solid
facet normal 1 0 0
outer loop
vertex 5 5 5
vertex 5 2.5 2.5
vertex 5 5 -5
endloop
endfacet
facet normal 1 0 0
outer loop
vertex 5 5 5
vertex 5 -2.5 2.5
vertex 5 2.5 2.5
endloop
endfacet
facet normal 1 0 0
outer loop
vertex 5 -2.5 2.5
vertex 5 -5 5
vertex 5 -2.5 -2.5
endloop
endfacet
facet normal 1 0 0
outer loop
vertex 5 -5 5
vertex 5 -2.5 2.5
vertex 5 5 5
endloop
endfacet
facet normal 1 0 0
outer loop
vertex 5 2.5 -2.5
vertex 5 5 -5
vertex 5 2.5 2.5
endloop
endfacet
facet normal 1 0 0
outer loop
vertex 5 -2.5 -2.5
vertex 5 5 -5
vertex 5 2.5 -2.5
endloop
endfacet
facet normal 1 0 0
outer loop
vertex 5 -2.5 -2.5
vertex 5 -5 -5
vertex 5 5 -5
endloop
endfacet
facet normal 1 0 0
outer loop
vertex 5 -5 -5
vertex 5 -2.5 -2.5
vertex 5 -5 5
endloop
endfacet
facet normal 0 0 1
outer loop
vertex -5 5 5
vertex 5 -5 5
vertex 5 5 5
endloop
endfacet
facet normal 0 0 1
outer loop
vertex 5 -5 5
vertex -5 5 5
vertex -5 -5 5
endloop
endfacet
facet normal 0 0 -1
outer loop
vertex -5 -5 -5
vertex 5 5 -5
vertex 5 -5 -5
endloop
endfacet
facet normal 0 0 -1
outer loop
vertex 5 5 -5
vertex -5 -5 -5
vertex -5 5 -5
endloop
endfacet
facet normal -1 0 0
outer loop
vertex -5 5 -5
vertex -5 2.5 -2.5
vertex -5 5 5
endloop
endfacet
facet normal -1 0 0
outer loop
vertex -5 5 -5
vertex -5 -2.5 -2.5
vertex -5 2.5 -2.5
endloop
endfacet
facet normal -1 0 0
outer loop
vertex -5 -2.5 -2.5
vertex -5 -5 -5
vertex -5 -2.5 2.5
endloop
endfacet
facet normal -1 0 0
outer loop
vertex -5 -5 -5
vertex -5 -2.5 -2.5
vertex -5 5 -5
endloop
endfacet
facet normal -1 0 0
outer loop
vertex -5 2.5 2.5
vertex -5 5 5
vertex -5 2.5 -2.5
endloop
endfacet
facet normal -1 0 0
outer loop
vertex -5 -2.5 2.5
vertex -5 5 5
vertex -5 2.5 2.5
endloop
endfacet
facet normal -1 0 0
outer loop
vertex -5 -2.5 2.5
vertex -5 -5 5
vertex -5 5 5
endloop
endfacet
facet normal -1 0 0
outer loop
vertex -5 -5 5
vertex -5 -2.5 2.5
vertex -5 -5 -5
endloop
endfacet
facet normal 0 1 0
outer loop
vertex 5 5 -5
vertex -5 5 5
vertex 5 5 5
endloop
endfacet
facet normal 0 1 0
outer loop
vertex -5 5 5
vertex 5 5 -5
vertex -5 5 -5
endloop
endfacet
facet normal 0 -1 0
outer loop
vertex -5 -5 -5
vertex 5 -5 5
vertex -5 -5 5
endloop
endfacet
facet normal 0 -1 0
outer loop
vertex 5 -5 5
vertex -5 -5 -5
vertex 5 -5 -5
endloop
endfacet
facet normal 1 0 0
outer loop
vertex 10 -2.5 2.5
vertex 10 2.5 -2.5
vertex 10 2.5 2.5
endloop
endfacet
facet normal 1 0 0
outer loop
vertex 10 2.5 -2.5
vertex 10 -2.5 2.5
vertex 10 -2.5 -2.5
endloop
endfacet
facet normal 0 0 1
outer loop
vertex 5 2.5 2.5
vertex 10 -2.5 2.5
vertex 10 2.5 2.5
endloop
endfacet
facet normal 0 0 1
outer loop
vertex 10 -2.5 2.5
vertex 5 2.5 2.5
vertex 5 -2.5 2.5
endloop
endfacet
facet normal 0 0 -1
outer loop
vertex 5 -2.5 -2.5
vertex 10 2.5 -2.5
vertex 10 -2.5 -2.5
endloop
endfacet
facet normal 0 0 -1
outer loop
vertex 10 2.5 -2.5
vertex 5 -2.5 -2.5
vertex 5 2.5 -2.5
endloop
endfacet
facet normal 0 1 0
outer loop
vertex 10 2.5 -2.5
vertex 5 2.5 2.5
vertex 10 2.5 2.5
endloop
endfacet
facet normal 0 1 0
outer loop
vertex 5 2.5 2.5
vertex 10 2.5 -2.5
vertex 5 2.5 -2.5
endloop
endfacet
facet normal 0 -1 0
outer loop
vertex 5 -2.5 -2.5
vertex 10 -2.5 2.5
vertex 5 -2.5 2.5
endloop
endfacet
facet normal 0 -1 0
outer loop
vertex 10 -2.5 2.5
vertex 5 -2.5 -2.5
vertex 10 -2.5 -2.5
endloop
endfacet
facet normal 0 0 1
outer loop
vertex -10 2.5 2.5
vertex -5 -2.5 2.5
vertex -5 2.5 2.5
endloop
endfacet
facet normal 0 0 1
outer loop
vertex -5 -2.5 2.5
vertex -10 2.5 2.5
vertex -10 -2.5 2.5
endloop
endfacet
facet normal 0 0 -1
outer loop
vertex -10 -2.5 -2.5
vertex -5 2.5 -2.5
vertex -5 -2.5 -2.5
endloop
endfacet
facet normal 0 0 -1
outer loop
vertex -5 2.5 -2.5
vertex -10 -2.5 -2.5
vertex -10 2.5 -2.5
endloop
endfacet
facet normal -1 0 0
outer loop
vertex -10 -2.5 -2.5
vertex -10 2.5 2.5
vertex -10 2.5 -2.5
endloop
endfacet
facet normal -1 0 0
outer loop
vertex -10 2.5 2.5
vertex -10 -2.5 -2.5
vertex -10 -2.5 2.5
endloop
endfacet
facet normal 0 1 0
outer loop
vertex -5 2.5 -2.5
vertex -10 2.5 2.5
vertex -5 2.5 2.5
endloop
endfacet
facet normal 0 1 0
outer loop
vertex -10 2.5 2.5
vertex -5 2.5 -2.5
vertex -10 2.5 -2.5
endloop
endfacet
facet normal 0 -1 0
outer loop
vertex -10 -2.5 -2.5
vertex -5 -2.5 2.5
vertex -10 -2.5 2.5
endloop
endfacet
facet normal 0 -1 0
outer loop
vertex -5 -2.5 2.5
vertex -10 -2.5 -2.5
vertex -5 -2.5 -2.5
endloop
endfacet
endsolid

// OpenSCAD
/*
// from corner cube
frameExtrusions = [
    0,      // north
    0,      // east
    10,     // south
    10,     // west
    0,      // up
    0       // down
];

unitVectors = [
    [ 1,  0,  0], // north
    [ 0,  1,  0], // east
    [-1,  0,  0], // south
    [ 0, -1,  0], // west
    [ 0,  0,  1], // up
    [ 0,  0, -1]  // down
];
*/

cornerCubeDimensions = [10,10,10];


slack = 0.45            ;

legOuterDim = [10,10,10];
legInnerDim = [5,5,5];


//
module leg() {
    difference() {
        cube(size=legOuterDim, center=true);
        translate(v=[0,0,(legOuterDim[2]-legInnerDim[2])/2])
        cube(size=[legInnerDim[0]+slack, legInnerDim[1]+slack, legInnerDim[2]+slack], center=true); 
    }
}


module threeJoin() {
// corner cube
    
difference() {
    rotate(a=90, v=[0,0,1])
union() {
cube(size=cornerCubeDimensions, center=true);

translate(v=[0,0,10])
leg();

translate(v=[0,-10,0])
rotate(a=[90,0,0])
leg();

translate(v=[10,0,0])
rotate(a=[0,90,0])
leg();
}
    translate(v=[10,10,-20])
    rotate(a=135, v=[1,-1,0])
    cube(size=[100,100,100]);

}
    
}

    translate(v=[10,10,-20])
    rotate(a=135, v=[1,-1,0])
    *cube(size=[100,100,100]);

module frameBar() {
    cube(size=[10,10,10], center=true);

    translate(v=[7.5,0,0])
    cube(size=[5,5,5], center=true);
    
    translate(v=[-7.5,0,0])
    cube(size=[5,5,5], center=true);
}

translate(v=[0,0,5])
rotate(a=45, v=[1,-1,0])
*threeJoin();

frameBar();

oslack = 0.05;
module old() {
cube(size=[160,10,10], center=true);

translate(v=[82.5,0,0])
cube(size=[5+oslack,5+oslack,5+oslack], center=true);
    
translate(v=[-82.5,0,0])
cube(size=[5+oslack,5+oslack,5+oslack], center=true);

}



module baseBar() {
    
    
}
//old();
